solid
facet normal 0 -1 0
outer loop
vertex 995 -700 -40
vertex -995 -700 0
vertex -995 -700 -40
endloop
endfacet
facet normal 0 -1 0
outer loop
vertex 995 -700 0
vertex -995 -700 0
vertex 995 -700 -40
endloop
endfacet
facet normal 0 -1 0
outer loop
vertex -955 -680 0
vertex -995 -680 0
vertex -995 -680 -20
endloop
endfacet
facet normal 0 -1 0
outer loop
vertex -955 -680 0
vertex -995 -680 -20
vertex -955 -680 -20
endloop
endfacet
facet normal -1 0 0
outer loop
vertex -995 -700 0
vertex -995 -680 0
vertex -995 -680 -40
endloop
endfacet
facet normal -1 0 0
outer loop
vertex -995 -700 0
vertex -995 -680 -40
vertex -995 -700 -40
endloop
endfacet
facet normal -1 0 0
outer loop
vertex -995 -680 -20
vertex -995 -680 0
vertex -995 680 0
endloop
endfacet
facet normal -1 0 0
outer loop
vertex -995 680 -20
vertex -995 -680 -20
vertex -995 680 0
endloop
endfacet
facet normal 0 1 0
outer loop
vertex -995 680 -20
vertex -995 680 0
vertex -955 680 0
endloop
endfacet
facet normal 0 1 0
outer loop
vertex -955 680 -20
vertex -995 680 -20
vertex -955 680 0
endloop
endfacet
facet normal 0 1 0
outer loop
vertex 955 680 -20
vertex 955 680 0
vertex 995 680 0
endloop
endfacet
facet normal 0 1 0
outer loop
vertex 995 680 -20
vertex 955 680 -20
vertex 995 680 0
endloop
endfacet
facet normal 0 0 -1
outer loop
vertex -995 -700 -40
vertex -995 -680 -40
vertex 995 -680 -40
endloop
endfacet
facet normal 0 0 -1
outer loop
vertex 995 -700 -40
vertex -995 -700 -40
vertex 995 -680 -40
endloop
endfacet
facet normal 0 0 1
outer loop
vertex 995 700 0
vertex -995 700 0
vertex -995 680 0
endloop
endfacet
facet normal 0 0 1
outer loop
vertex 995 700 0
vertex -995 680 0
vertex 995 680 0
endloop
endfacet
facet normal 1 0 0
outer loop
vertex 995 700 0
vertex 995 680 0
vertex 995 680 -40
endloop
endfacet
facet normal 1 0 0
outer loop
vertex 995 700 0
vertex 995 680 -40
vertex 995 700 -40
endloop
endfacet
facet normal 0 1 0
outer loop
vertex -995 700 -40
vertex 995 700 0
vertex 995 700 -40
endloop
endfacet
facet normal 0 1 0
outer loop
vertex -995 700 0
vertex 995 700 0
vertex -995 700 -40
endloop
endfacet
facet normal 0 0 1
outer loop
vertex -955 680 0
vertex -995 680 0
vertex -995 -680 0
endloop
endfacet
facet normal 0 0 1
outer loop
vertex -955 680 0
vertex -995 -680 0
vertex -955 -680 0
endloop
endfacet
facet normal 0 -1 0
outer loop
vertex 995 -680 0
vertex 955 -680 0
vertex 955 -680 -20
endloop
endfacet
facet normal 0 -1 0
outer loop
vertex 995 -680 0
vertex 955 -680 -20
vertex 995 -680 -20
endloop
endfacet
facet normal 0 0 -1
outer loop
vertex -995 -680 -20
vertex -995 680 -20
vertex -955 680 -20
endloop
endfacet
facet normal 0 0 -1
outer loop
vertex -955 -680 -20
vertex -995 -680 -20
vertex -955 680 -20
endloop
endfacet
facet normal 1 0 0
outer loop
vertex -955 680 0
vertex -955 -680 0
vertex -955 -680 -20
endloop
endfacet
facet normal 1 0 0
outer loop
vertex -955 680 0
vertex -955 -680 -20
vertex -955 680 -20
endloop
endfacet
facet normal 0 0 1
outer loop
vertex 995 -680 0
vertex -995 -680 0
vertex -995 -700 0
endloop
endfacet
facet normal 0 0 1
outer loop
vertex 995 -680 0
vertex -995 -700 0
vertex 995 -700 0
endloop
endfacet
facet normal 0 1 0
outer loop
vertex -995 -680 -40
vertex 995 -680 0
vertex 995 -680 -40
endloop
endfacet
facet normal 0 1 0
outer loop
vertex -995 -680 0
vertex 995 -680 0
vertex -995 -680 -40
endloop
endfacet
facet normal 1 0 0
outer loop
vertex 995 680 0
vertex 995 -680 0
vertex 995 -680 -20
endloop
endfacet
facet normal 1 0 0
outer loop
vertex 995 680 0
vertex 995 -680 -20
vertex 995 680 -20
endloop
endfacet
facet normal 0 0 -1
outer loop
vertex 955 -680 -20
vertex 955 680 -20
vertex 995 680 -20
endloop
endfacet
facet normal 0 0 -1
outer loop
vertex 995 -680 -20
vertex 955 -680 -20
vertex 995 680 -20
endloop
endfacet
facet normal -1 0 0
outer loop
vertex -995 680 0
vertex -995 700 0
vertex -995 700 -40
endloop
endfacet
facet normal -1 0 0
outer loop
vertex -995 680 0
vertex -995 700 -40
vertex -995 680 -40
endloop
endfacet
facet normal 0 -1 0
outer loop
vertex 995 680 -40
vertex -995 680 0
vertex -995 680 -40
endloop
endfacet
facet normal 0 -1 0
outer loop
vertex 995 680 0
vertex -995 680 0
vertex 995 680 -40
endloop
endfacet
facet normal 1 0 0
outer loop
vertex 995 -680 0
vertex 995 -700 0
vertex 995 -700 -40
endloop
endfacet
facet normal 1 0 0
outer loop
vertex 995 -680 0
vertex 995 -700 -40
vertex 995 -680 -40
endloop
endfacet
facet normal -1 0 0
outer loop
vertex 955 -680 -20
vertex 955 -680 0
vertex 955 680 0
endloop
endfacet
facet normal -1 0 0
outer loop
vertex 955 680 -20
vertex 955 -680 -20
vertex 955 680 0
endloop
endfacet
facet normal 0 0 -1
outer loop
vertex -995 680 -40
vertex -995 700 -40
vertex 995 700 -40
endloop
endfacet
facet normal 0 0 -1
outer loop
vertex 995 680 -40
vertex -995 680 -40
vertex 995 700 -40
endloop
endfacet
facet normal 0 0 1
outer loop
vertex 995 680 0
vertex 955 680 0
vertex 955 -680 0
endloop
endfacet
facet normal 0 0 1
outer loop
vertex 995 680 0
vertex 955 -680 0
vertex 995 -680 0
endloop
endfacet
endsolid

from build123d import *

# Parameters (mm, degrees)
F1_DEPTH = 40
F0_W     = 40
F0_H     = 1360
F2_DEPTH = 20


with BuildPart() as f1:
    # F0 (on Top) → F1 (new body)
    with BuildSketch(Plane.XY):
        Polygon((995, 680), (995, 700), (-995, 700), (-995, 680), (-955, 680), (955, 680), align=None)
        Polygon((995, -700), (995, -680), (955, -680), (-955, -680), (-995, -680), (-995, -700), align=None)
    extrude(amount=-F1_DEPTH)


with BuildPart() as f2:
    # F0 (on Top) → F2 (new body)
    with BuildSketch(Plane.XY):
        with Locations((975, 0)):
            Rectangle(F0_W, F0_H)
        with Locations((-975, 0)):
            Rectangle(F0_W, F0_H)
    extrude(amount=-F2_DEPTH)


solid = Compound([f1.part, f2.part])
